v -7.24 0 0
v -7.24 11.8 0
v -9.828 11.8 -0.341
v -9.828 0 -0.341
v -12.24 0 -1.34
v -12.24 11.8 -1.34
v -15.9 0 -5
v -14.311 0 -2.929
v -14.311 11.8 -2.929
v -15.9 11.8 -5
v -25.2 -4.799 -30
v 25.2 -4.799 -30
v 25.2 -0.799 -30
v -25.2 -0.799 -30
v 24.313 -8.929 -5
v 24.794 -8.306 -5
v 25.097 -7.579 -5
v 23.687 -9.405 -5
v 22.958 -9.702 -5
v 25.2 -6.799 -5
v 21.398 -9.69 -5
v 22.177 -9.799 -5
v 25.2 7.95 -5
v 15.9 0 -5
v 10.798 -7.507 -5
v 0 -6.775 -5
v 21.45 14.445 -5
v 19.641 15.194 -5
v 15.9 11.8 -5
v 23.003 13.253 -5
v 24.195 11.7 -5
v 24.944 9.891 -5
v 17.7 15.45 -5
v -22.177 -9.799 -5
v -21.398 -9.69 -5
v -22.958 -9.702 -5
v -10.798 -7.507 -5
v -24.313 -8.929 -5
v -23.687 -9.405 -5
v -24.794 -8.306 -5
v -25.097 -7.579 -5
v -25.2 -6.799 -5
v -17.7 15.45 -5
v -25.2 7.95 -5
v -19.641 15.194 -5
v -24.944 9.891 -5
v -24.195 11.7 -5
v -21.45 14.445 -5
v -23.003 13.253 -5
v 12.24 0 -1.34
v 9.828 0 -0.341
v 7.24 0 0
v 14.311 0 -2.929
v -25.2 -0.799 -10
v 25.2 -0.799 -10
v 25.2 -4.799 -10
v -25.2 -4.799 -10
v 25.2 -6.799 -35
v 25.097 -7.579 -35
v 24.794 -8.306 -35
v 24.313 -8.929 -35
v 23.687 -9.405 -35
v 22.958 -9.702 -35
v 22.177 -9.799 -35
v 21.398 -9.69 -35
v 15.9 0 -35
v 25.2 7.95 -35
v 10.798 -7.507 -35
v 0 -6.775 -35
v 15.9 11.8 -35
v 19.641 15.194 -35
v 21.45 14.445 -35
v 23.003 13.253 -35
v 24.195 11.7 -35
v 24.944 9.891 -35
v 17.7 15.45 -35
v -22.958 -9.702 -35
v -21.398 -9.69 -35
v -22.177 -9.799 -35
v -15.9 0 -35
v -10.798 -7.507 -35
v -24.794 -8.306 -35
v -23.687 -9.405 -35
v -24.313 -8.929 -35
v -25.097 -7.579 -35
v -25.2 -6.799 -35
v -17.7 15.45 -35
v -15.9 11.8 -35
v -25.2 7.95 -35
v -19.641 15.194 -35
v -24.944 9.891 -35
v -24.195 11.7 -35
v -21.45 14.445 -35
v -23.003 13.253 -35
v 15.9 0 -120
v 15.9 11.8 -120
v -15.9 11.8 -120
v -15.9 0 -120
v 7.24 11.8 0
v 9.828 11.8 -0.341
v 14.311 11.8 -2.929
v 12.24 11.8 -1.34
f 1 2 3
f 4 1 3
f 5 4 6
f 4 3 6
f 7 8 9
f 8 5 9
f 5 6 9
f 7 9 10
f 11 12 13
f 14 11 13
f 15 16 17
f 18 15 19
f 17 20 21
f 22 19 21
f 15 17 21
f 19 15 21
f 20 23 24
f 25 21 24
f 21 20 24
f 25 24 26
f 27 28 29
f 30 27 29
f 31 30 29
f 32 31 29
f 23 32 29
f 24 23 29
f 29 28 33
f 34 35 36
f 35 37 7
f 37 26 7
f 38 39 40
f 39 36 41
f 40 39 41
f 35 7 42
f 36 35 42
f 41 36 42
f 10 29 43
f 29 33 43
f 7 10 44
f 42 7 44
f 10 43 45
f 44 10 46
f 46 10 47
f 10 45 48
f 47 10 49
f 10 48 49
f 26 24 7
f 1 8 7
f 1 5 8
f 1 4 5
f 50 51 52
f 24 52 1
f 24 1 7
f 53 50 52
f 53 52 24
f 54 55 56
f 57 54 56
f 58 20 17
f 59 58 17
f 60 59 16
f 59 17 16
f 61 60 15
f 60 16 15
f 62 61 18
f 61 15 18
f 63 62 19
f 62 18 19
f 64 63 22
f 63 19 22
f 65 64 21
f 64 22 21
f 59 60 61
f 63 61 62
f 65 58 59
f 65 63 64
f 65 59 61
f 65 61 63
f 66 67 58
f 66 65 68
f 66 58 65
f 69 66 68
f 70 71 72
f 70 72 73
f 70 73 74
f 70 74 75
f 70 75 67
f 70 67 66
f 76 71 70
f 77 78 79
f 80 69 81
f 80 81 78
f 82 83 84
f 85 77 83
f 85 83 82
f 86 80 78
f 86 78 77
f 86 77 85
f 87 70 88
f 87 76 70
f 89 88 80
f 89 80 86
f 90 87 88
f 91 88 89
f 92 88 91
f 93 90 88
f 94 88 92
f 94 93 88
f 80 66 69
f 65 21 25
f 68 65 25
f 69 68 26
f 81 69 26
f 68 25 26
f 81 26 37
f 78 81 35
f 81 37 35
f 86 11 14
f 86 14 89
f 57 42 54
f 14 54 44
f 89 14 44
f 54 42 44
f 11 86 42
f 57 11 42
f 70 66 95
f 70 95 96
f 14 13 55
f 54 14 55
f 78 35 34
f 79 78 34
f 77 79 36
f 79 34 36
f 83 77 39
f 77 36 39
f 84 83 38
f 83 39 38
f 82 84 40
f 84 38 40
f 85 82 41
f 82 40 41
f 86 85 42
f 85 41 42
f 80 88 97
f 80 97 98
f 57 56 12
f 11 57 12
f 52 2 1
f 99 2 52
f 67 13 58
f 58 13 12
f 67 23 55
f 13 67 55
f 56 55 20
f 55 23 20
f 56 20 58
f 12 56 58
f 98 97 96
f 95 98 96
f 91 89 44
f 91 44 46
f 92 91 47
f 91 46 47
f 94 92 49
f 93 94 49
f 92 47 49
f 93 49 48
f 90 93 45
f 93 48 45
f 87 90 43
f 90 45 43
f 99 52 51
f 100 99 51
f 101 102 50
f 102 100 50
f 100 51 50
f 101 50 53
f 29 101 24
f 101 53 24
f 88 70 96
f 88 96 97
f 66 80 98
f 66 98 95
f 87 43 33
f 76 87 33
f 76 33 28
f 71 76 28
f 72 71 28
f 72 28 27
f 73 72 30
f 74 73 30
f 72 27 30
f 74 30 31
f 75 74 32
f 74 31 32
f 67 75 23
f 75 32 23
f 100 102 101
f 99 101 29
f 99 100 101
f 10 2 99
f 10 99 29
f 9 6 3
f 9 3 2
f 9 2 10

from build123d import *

# Parameters (mm, degrees)
BOSS_EXTRUDE1_DEPTH = 120
BOSS_EXTRUDE2_DEPTH = 30
FILLET1_R           = 10
FILLET2_R           = 10
CUT_EXTRUDE1_DEPTH  = 85


with BuildPart() as part:
    # Sketch1 → Boss-Extrude1 (new body)
    with BuildSketch(Plane.XY):
        Polygon((0, 0), (15.9, 0), (15.9, 11.8), (-15.9, 11.8), (-15.9, 0), align=None)
    extrude(amount=-BOSS_EXTRUDE1_DEPTH)

    # Sketch2 → Boss-Extrude2 (add)
    with BuildSketch(Plane.XY.offset(-5)):
        with BuildLine():
            Line((-15.9, 15.45), (17.7, 15.45))
            ThreePointArc((17.7, 15.45), (23.003300859, 13.253300859), (25.2, 7.95))
            Line((25.2, 7.95), (25.2, -4.05))
            Line((25.2, -4.05), (25.2, -6.799114346))
            ThreePointArc((25.2, -6.799114346), (24.015595093, -9.187338468), (21.397590361, -9.689813011))
            ThreePointArc((21.397590361, -9.689813011), (0, -6.775110745), (-21.397590361, -9.689813011))
            ThreePointArc((-21.397590361, -9.689813011), (-24.015595093, -9.187338468), (-25.2, -6.799114346))
            Line((-25.2, -6.799114346), (-25.2, -4.05))
            Line((-25.2, -4.05), (-25.2, 7.95))
            ThreePointArc((-25.2, 7.95), (-23.003300859, 13.253300859), (-17.7, 15.45))
            Line((-17.7, 15.45), (-15.9, 15.45))
        make_face()
    extrude(amount=-BOSS_EXTRUDE2_DEPTH)

    # Fillet1
    # the kernel refuses this fillet: 10 mm, written as the material it takes off along each edge
    with BuildSketch(Plane(origin=(15.9, -21.650635095, 0), x_dir=(0, 0, -1), z_dir=(0, 1, 0))) as fillet1_piece_1:
        with BuildLine():
            CenterArc((10, 8.660254038), FILLET1_R, 180, 60)
            Line((0, 8.660254038), (-0.2, 8.660254038))
            Line((-0.2, 8.660254038), (-0.2, 0))
            Line((-0.2, 0), (0, -0.2))
            ThreePointArc((0, -0.2), (2.5, -0.2), (4.9, -0.173205081))
            Line((4.9, -0.173205081), (5, 0))
        make_face()
    extrude(amount=55.101270189, mode=Mode.SUBTRACT)

    # Fillet2
    # the kernel refuses this fillet: 10 mm, written as the material it takes off along each edge
    with BuildSketch(Plane(origin=(-15.9, 33.450635095, 0), x_dir=(1, 0, 0), z_dir=(0, -1, 0))) as fillet2_piece_1:
        with BuildLine():
            CenterArc((8.660254038, -10), FILLET2_R, 90, 60)
            Line((0, -5), (-0.173205081, -4.9))
            ThreePointArc((-0.173205081, -4.9), (-0.2, -2.5), (-0.2, 0))
            Line((-0.2, 0), (0, 0.2))
            Line((0, 0.2), (8.660254038, 0.2))
            Line((8.660254038, 0.2), (8.660254038, 0))
        make_face()
    extrude(amount=55.101270189, mode=Mode.SUBTRACT)

    # Sketch3 → Cut-Extrude1 (cut)
    with BuildSketch(Plane(origin=(25.2, 0, 0), x_dir=(0, 0, -1), z_dir=(1, 0, 0))):
        Polygon((20, -4.799114346), (30, -4.799114346), (30, -0.799114346), (10, -0.799114346), (10, -4.799114346), align=None)
    extrude(amount=-CUT_EXTRUDE1_DEPTH, mode=Mode.SUBTRACT)


solid = part.part
